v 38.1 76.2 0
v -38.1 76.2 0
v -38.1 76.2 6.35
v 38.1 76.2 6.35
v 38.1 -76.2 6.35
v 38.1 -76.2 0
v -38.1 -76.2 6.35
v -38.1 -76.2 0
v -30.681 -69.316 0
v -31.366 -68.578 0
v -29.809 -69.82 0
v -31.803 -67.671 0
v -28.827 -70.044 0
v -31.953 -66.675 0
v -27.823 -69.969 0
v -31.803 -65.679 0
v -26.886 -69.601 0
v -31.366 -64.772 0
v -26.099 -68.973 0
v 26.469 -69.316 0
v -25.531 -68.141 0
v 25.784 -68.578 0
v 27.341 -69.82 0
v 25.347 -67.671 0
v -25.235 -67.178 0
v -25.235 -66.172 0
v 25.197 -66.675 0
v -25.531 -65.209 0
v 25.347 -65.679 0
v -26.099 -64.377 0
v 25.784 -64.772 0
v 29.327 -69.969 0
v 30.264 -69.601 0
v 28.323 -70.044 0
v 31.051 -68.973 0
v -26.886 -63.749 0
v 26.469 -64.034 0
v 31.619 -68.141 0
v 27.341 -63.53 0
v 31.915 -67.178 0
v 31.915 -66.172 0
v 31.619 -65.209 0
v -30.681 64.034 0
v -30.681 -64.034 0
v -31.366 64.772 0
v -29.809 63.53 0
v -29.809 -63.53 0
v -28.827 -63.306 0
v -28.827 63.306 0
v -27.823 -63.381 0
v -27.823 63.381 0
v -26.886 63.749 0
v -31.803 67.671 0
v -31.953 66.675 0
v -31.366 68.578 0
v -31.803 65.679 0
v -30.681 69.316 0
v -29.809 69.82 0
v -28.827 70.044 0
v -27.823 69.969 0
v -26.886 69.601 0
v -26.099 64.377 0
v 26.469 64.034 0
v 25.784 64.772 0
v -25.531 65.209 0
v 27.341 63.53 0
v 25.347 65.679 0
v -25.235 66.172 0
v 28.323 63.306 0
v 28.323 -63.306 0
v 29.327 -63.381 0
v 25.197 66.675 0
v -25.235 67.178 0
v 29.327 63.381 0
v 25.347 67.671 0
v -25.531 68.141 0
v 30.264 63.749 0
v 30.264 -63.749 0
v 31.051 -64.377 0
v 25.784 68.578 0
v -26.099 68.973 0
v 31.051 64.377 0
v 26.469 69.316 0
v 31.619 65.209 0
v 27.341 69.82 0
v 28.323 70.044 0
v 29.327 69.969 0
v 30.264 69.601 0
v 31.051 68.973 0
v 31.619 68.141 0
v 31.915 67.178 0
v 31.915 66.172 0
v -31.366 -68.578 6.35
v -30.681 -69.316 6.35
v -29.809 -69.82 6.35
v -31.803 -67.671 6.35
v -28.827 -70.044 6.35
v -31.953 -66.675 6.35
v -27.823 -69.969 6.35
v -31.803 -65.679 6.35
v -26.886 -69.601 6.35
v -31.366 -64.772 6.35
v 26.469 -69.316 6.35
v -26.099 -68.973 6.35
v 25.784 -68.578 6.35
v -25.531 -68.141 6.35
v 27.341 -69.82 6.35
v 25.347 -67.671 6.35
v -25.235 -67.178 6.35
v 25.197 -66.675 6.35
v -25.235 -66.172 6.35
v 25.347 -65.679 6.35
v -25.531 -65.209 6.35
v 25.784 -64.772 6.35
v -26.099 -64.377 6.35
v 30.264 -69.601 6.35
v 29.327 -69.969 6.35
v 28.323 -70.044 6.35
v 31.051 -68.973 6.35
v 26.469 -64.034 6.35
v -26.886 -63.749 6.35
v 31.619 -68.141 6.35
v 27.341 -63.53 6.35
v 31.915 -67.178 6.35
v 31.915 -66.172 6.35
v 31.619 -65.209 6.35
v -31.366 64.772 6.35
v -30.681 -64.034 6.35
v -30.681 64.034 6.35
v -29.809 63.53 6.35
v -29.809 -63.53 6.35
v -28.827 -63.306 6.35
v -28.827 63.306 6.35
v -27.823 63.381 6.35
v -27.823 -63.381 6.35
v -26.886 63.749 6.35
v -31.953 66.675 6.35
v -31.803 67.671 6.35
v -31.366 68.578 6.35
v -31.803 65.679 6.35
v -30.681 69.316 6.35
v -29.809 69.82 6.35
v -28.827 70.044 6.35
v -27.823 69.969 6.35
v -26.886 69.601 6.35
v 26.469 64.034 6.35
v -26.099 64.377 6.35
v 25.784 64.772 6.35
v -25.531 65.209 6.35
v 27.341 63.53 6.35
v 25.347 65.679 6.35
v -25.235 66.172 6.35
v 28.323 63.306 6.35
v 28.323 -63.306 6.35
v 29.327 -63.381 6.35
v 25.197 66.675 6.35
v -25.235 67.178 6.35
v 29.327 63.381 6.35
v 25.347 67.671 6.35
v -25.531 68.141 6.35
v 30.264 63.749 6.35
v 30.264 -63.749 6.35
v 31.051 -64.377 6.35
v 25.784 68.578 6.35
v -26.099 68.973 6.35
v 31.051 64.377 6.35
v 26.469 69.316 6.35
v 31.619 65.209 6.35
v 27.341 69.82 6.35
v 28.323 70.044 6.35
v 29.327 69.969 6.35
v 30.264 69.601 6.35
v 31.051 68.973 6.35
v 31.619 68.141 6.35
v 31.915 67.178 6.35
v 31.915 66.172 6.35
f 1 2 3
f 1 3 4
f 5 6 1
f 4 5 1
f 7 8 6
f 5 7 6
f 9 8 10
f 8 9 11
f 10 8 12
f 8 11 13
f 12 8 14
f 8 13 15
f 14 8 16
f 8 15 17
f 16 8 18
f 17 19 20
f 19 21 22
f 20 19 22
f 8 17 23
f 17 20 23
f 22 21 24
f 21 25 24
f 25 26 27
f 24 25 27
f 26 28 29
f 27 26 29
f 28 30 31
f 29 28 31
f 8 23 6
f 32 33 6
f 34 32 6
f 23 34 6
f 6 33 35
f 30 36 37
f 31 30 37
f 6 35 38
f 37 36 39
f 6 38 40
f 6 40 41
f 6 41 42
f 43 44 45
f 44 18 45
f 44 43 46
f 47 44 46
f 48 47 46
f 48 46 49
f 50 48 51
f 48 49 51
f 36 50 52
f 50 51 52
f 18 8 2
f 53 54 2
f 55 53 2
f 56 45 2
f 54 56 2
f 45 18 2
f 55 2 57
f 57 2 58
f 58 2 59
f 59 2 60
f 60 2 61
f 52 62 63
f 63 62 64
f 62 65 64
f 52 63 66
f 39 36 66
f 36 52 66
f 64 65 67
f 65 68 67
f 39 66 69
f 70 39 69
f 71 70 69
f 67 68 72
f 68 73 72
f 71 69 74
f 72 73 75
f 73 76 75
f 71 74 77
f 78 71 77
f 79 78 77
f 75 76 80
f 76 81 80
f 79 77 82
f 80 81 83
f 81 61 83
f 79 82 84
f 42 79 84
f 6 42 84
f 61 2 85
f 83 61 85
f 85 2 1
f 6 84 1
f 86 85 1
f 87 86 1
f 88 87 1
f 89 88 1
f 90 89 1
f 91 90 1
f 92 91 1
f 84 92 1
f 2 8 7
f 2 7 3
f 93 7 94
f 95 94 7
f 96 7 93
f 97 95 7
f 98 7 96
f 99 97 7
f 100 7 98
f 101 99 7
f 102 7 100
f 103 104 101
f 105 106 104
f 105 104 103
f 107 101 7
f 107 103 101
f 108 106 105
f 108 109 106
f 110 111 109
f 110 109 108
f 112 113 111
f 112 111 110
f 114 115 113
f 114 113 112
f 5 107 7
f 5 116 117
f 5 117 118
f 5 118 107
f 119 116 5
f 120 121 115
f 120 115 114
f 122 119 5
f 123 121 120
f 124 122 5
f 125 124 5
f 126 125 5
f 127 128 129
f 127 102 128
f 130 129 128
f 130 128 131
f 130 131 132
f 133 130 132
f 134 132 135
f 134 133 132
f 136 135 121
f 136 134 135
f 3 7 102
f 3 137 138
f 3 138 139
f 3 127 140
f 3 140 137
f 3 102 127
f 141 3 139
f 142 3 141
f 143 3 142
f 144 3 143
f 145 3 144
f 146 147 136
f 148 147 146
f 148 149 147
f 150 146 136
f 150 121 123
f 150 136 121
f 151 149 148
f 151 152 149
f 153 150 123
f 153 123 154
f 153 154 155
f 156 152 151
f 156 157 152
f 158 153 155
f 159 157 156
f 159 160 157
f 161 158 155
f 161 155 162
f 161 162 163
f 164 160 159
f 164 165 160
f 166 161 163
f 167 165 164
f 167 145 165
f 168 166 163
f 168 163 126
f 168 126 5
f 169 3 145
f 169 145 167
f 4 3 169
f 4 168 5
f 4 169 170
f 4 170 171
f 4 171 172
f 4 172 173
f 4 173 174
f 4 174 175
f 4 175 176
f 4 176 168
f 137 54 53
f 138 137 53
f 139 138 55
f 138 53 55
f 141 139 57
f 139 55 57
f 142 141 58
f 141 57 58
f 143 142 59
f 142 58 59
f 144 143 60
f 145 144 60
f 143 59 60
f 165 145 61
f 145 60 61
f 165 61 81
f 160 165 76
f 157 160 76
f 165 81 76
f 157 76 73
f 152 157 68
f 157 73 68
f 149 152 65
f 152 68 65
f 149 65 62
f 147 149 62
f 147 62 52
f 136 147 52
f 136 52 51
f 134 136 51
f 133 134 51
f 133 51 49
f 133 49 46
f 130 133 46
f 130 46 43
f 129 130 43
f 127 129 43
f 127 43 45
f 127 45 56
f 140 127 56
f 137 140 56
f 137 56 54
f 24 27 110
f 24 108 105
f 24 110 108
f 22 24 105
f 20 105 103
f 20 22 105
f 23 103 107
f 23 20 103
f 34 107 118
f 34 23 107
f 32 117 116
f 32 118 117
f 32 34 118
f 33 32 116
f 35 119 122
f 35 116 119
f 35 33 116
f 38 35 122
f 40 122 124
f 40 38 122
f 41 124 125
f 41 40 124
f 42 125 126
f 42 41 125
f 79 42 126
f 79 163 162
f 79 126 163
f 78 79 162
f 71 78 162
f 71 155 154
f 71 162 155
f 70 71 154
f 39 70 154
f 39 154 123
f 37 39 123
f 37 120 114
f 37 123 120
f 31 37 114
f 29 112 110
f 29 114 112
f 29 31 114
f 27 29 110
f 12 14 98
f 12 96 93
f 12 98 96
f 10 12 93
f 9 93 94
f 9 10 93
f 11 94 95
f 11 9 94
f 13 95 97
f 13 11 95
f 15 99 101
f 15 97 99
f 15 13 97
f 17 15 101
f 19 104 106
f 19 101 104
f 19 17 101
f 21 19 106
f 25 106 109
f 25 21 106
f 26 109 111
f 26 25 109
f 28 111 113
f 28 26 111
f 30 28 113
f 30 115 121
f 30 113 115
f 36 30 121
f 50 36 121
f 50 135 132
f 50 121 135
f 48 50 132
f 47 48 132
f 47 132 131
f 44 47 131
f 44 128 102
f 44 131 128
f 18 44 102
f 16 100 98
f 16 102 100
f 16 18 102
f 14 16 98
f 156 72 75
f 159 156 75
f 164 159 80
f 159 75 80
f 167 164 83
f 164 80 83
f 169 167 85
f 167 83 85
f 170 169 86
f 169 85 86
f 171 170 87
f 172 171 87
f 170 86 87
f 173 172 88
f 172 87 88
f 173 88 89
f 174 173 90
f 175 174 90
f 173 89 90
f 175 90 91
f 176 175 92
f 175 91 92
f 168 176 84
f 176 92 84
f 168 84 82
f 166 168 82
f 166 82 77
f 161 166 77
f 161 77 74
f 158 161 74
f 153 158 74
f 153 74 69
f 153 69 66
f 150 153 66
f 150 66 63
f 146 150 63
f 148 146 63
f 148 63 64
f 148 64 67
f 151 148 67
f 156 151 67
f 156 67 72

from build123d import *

# Parameters (mm, degrees)
SKETCH1_W               = 76.2
SKETCH1_H               = 152.4
BOSS_EXTRUDE1_DEPTH     = 6.35
F_1_4_CLEARANCE_HOLE1_D = 6.7564


with BuildPart() as part:
    # Sketch1 → Boss-Extrude1 (new body)
    with BuildSketch(Plane.XY):
        Rectangle(SKETCH1_W, SKETCH1_H)
    extrude(amount=BOSS_EXTRUDE1_DEPTH)

    # 1/4 Clearance Hole1 (through all)
    with Locations(Plane.XY.offset(6.35)):
        with Locations((-28.575, 66.675), (28.575, 66.675)):
            f_1_4_clearance_hole1 = Hole(F_1_4_CLEARANCE_HOLE1_D / 2)

    # Mirror1: 1/4 Clearance Hole1 across plane
    add(f_1_4_clearance_hole1.mirror(Plane.ZX), mode=Mode.SUBTRACT)


solid = part.part
